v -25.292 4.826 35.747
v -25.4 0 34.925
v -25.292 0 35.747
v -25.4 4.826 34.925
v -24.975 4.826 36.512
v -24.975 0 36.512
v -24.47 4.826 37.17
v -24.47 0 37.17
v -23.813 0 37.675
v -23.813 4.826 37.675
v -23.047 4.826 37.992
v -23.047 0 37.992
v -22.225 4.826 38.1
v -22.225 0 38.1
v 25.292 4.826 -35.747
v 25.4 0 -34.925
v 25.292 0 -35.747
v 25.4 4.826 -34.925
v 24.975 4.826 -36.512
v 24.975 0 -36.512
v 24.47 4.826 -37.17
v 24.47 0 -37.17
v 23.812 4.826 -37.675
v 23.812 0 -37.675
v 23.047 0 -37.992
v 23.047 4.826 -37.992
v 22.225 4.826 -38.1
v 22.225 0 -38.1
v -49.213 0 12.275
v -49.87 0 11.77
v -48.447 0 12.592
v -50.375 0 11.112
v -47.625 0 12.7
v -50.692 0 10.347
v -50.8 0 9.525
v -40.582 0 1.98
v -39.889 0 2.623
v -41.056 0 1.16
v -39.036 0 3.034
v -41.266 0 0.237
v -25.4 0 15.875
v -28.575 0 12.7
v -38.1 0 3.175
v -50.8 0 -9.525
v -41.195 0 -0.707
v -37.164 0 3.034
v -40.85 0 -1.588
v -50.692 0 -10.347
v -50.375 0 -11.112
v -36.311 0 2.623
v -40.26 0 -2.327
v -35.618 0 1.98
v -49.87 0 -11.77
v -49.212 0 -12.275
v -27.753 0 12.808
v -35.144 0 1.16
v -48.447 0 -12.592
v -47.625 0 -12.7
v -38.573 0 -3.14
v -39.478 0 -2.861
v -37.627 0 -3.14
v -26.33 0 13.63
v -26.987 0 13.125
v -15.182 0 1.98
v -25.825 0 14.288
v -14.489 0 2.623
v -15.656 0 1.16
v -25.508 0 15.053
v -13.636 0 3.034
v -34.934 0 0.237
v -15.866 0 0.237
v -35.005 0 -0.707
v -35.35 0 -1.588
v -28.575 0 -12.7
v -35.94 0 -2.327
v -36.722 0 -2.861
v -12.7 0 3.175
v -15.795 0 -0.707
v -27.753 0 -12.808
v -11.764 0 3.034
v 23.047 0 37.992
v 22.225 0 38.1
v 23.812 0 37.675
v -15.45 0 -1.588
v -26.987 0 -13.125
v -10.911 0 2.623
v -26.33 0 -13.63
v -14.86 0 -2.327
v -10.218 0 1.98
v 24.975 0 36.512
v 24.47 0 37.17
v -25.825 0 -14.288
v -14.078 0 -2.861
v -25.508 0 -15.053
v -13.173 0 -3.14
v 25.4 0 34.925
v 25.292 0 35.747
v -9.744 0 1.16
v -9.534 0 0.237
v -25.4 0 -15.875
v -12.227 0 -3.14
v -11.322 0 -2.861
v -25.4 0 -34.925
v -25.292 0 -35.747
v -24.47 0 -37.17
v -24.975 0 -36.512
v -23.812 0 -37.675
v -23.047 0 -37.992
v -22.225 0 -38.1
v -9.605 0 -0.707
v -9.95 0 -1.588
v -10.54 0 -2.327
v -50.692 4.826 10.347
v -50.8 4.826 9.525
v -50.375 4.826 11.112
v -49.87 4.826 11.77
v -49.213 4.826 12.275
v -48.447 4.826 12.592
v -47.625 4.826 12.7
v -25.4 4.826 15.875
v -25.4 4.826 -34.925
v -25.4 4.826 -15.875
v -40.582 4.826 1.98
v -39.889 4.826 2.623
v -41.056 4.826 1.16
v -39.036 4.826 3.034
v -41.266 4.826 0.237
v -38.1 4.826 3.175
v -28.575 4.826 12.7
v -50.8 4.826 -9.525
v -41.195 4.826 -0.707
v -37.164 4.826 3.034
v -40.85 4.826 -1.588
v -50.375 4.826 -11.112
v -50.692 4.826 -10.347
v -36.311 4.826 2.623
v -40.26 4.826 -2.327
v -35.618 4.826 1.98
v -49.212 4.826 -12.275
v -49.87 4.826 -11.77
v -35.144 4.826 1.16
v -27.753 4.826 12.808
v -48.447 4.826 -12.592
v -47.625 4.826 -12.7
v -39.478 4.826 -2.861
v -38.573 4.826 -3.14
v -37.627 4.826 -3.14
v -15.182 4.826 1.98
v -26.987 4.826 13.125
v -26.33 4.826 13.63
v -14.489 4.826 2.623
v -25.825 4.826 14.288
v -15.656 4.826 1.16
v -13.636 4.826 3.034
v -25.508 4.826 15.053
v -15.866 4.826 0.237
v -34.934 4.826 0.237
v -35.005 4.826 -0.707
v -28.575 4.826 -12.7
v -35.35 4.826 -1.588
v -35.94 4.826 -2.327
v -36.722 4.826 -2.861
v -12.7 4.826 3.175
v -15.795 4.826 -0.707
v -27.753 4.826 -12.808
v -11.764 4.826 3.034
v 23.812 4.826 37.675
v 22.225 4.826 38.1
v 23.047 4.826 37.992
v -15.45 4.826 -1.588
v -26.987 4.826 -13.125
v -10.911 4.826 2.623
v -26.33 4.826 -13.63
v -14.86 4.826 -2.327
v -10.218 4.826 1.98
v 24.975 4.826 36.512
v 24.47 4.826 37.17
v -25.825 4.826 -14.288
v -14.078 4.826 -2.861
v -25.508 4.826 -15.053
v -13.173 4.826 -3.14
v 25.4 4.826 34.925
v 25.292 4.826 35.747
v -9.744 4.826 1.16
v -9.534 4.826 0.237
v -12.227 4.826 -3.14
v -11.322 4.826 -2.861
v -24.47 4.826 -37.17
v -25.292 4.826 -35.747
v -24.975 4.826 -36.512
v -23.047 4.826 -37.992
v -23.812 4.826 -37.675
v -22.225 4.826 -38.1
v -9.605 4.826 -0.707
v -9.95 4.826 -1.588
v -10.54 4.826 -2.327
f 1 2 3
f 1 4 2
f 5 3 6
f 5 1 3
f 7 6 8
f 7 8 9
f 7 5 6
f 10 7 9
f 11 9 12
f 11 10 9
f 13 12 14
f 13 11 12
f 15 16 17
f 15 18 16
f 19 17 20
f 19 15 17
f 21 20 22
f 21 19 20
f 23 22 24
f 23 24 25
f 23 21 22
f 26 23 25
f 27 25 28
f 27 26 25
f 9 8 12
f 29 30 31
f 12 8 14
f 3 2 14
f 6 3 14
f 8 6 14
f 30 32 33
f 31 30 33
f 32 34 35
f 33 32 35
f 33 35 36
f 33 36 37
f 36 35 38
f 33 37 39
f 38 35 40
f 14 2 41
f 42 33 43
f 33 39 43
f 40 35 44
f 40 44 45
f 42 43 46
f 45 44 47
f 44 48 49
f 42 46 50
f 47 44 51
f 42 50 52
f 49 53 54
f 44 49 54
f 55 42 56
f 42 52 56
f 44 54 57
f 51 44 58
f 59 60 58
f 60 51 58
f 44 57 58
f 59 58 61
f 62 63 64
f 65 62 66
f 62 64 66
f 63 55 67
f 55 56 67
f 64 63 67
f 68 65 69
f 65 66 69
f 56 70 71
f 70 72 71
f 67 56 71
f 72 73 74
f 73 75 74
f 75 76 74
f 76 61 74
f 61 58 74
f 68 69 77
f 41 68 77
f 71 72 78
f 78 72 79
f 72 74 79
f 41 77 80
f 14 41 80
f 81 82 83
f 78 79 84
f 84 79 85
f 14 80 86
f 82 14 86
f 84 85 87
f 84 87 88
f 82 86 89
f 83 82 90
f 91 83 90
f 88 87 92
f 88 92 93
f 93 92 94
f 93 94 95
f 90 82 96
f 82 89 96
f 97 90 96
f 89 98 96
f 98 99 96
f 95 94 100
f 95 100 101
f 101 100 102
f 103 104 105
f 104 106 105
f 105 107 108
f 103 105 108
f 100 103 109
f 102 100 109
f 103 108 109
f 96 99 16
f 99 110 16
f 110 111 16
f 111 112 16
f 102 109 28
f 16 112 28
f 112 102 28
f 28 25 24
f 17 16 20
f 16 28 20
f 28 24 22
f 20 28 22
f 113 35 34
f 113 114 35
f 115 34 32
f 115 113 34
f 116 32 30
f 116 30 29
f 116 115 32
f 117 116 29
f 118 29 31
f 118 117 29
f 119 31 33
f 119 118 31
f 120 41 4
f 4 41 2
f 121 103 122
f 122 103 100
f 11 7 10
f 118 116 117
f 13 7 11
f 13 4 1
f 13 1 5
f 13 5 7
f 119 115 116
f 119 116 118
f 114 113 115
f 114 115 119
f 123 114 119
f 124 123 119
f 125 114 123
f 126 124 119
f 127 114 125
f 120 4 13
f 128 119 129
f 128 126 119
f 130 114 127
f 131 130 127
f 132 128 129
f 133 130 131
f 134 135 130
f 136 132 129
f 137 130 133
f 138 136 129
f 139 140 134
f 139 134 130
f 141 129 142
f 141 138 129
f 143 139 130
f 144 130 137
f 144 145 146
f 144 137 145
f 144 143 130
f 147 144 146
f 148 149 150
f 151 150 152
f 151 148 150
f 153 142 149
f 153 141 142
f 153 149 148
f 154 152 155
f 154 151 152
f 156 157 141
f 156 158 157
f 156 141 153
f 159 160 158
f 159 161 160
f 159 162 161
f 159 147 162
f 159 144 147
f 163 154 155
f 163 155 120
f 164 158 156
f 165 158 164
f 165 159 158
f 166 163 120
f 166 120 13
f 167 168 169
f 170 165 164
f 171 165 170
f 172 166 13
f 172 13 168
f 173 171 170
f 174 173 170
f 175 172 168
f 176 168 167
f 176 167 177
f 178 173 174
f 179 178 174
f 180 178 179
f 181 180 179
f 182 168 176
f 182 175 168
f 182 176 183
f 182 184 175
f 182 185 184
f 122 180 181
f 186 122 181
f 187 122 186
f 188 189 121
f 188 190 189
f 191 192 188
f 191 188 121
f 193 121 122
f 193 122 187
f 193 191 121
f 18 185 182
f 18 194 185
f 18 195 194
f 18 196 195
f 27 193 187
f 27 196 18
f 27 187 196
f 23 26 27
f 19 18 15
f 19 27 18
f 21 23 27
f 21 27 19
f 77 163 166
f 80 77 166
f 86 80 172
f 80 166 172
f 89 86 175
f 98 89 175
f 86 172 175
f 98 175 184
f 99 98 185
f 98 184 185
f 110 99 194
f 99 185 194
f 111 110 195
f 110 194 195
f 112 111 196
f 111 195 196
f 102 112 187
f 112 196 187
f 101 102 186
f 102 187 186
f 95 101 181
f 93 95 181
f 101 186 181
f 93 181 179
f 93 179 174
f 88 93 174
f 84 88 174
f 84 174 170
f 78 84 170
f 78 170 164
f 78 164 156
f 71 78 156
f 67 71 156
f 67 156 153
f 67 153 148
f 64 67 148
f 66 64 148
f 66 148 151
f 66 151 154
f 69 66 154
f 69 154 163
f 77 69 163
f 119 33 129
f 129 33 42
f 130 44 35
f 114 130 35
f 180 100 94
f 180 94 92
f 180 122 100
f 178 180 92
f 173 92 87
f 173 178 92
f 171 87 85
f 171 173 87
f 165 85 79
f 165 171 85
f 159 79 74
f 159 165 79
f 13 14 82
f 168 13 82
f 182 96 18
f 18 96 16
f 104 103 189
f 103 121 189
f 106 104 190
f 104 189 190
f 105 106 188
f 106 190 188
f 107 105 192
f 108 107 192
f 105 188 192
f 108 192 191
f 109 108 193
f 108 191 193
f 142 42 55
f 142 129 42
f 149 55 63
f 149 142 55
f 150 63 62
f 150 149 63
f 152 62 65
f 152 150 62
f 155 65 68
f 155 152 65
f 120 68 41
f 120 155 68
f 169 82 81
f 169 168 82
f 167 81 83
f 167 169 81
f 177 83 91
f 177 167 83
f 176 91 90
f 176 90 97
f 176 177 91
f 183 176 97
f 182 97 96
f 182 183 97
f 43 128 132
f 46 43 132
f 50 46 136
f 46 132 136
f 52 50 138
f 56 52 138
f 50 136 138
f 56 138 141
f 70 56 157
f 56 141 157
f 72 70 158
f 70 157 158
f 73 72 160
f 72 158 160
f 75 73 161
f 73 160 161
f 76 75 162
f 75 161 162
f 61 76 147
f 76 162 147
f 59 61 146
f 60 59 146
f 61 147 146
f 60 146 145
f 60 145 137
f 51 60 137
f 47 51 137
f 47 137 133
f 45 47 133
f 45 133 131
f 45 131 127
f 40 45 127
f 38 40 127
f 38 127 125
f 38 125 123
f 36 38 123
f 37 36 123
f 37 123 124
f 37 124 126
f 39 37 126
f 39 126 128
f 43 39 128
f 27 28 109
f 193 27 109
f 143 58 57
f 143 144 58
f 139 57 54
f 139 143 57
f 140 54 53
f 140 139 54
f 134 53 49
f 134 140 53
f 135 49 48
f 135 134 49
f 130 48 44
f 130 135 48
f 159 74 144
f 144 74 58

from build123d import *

# Parameters (mm, degrees)
BOSS_EXTRUDE1_DEPTH = 4.826
FILLET1_R           = 3.175
SKETCH2_R           = 3.175
CUT_EXTRUDE1_DEPTH  = 64.68312395


with BuildPart() as part:
    # Sketch1 → Boss-Extrude1 (new body)
    with BuildSketch(Plane(origin=(0, 0, 0), x_dir=(1, 0, 0), z_dir=(0, 1, 0))):
        Polygon((-25.4, 38.1), (-25.4, 12.7), (-50.8, 12.7), (-50.8, -12.7), (-25.4, -12.7), (-25.4, -38.1), (25.4, -38.1), (25.4, 38.1), align=None)
    extrude(amount=BOSS_EXTRUDE1_DEPTH)

    # Fillet1
    fillet1_edges = [part.edges().sort_by_distance(p)[0] for p in [
        (25.4, 2.413, -38.1),
        (25.4, 2.413, 38.1),
        (-25.4, 2.413, 38.1),
        (-25.4, 2.413, 12.7),
        (-50.8, 2.413, 12.7),
        (-50.8, 2.413, -12.7),
        (-25.4, 2.413, -12.7),
        (-25.4, 2.413, -38.1),
    ]]
    fillet(fillet1_edges, radius=FILLET1_R)

    # Sketch2 → Cut-Extrude1 (cut, through all)
    with BuildSketch(Plane(origin=(0, 4.826, 0), x_dir=(1, 0, 0), z_dir=(0, 1, 0))):
        with Locations(Location((-38.1, 0, 0), (0, 0, 270))):
            Circle(SKETCH2_R)
        with Locations(Location((-12.7, 0, 0), (0, 0, 270))):
            Circle(SKETCH2_R)
    extrude(amount=-CUT_EXTRUDE1_DEPTH, mode=Mode.SUBTRACT)


solid = part.part
